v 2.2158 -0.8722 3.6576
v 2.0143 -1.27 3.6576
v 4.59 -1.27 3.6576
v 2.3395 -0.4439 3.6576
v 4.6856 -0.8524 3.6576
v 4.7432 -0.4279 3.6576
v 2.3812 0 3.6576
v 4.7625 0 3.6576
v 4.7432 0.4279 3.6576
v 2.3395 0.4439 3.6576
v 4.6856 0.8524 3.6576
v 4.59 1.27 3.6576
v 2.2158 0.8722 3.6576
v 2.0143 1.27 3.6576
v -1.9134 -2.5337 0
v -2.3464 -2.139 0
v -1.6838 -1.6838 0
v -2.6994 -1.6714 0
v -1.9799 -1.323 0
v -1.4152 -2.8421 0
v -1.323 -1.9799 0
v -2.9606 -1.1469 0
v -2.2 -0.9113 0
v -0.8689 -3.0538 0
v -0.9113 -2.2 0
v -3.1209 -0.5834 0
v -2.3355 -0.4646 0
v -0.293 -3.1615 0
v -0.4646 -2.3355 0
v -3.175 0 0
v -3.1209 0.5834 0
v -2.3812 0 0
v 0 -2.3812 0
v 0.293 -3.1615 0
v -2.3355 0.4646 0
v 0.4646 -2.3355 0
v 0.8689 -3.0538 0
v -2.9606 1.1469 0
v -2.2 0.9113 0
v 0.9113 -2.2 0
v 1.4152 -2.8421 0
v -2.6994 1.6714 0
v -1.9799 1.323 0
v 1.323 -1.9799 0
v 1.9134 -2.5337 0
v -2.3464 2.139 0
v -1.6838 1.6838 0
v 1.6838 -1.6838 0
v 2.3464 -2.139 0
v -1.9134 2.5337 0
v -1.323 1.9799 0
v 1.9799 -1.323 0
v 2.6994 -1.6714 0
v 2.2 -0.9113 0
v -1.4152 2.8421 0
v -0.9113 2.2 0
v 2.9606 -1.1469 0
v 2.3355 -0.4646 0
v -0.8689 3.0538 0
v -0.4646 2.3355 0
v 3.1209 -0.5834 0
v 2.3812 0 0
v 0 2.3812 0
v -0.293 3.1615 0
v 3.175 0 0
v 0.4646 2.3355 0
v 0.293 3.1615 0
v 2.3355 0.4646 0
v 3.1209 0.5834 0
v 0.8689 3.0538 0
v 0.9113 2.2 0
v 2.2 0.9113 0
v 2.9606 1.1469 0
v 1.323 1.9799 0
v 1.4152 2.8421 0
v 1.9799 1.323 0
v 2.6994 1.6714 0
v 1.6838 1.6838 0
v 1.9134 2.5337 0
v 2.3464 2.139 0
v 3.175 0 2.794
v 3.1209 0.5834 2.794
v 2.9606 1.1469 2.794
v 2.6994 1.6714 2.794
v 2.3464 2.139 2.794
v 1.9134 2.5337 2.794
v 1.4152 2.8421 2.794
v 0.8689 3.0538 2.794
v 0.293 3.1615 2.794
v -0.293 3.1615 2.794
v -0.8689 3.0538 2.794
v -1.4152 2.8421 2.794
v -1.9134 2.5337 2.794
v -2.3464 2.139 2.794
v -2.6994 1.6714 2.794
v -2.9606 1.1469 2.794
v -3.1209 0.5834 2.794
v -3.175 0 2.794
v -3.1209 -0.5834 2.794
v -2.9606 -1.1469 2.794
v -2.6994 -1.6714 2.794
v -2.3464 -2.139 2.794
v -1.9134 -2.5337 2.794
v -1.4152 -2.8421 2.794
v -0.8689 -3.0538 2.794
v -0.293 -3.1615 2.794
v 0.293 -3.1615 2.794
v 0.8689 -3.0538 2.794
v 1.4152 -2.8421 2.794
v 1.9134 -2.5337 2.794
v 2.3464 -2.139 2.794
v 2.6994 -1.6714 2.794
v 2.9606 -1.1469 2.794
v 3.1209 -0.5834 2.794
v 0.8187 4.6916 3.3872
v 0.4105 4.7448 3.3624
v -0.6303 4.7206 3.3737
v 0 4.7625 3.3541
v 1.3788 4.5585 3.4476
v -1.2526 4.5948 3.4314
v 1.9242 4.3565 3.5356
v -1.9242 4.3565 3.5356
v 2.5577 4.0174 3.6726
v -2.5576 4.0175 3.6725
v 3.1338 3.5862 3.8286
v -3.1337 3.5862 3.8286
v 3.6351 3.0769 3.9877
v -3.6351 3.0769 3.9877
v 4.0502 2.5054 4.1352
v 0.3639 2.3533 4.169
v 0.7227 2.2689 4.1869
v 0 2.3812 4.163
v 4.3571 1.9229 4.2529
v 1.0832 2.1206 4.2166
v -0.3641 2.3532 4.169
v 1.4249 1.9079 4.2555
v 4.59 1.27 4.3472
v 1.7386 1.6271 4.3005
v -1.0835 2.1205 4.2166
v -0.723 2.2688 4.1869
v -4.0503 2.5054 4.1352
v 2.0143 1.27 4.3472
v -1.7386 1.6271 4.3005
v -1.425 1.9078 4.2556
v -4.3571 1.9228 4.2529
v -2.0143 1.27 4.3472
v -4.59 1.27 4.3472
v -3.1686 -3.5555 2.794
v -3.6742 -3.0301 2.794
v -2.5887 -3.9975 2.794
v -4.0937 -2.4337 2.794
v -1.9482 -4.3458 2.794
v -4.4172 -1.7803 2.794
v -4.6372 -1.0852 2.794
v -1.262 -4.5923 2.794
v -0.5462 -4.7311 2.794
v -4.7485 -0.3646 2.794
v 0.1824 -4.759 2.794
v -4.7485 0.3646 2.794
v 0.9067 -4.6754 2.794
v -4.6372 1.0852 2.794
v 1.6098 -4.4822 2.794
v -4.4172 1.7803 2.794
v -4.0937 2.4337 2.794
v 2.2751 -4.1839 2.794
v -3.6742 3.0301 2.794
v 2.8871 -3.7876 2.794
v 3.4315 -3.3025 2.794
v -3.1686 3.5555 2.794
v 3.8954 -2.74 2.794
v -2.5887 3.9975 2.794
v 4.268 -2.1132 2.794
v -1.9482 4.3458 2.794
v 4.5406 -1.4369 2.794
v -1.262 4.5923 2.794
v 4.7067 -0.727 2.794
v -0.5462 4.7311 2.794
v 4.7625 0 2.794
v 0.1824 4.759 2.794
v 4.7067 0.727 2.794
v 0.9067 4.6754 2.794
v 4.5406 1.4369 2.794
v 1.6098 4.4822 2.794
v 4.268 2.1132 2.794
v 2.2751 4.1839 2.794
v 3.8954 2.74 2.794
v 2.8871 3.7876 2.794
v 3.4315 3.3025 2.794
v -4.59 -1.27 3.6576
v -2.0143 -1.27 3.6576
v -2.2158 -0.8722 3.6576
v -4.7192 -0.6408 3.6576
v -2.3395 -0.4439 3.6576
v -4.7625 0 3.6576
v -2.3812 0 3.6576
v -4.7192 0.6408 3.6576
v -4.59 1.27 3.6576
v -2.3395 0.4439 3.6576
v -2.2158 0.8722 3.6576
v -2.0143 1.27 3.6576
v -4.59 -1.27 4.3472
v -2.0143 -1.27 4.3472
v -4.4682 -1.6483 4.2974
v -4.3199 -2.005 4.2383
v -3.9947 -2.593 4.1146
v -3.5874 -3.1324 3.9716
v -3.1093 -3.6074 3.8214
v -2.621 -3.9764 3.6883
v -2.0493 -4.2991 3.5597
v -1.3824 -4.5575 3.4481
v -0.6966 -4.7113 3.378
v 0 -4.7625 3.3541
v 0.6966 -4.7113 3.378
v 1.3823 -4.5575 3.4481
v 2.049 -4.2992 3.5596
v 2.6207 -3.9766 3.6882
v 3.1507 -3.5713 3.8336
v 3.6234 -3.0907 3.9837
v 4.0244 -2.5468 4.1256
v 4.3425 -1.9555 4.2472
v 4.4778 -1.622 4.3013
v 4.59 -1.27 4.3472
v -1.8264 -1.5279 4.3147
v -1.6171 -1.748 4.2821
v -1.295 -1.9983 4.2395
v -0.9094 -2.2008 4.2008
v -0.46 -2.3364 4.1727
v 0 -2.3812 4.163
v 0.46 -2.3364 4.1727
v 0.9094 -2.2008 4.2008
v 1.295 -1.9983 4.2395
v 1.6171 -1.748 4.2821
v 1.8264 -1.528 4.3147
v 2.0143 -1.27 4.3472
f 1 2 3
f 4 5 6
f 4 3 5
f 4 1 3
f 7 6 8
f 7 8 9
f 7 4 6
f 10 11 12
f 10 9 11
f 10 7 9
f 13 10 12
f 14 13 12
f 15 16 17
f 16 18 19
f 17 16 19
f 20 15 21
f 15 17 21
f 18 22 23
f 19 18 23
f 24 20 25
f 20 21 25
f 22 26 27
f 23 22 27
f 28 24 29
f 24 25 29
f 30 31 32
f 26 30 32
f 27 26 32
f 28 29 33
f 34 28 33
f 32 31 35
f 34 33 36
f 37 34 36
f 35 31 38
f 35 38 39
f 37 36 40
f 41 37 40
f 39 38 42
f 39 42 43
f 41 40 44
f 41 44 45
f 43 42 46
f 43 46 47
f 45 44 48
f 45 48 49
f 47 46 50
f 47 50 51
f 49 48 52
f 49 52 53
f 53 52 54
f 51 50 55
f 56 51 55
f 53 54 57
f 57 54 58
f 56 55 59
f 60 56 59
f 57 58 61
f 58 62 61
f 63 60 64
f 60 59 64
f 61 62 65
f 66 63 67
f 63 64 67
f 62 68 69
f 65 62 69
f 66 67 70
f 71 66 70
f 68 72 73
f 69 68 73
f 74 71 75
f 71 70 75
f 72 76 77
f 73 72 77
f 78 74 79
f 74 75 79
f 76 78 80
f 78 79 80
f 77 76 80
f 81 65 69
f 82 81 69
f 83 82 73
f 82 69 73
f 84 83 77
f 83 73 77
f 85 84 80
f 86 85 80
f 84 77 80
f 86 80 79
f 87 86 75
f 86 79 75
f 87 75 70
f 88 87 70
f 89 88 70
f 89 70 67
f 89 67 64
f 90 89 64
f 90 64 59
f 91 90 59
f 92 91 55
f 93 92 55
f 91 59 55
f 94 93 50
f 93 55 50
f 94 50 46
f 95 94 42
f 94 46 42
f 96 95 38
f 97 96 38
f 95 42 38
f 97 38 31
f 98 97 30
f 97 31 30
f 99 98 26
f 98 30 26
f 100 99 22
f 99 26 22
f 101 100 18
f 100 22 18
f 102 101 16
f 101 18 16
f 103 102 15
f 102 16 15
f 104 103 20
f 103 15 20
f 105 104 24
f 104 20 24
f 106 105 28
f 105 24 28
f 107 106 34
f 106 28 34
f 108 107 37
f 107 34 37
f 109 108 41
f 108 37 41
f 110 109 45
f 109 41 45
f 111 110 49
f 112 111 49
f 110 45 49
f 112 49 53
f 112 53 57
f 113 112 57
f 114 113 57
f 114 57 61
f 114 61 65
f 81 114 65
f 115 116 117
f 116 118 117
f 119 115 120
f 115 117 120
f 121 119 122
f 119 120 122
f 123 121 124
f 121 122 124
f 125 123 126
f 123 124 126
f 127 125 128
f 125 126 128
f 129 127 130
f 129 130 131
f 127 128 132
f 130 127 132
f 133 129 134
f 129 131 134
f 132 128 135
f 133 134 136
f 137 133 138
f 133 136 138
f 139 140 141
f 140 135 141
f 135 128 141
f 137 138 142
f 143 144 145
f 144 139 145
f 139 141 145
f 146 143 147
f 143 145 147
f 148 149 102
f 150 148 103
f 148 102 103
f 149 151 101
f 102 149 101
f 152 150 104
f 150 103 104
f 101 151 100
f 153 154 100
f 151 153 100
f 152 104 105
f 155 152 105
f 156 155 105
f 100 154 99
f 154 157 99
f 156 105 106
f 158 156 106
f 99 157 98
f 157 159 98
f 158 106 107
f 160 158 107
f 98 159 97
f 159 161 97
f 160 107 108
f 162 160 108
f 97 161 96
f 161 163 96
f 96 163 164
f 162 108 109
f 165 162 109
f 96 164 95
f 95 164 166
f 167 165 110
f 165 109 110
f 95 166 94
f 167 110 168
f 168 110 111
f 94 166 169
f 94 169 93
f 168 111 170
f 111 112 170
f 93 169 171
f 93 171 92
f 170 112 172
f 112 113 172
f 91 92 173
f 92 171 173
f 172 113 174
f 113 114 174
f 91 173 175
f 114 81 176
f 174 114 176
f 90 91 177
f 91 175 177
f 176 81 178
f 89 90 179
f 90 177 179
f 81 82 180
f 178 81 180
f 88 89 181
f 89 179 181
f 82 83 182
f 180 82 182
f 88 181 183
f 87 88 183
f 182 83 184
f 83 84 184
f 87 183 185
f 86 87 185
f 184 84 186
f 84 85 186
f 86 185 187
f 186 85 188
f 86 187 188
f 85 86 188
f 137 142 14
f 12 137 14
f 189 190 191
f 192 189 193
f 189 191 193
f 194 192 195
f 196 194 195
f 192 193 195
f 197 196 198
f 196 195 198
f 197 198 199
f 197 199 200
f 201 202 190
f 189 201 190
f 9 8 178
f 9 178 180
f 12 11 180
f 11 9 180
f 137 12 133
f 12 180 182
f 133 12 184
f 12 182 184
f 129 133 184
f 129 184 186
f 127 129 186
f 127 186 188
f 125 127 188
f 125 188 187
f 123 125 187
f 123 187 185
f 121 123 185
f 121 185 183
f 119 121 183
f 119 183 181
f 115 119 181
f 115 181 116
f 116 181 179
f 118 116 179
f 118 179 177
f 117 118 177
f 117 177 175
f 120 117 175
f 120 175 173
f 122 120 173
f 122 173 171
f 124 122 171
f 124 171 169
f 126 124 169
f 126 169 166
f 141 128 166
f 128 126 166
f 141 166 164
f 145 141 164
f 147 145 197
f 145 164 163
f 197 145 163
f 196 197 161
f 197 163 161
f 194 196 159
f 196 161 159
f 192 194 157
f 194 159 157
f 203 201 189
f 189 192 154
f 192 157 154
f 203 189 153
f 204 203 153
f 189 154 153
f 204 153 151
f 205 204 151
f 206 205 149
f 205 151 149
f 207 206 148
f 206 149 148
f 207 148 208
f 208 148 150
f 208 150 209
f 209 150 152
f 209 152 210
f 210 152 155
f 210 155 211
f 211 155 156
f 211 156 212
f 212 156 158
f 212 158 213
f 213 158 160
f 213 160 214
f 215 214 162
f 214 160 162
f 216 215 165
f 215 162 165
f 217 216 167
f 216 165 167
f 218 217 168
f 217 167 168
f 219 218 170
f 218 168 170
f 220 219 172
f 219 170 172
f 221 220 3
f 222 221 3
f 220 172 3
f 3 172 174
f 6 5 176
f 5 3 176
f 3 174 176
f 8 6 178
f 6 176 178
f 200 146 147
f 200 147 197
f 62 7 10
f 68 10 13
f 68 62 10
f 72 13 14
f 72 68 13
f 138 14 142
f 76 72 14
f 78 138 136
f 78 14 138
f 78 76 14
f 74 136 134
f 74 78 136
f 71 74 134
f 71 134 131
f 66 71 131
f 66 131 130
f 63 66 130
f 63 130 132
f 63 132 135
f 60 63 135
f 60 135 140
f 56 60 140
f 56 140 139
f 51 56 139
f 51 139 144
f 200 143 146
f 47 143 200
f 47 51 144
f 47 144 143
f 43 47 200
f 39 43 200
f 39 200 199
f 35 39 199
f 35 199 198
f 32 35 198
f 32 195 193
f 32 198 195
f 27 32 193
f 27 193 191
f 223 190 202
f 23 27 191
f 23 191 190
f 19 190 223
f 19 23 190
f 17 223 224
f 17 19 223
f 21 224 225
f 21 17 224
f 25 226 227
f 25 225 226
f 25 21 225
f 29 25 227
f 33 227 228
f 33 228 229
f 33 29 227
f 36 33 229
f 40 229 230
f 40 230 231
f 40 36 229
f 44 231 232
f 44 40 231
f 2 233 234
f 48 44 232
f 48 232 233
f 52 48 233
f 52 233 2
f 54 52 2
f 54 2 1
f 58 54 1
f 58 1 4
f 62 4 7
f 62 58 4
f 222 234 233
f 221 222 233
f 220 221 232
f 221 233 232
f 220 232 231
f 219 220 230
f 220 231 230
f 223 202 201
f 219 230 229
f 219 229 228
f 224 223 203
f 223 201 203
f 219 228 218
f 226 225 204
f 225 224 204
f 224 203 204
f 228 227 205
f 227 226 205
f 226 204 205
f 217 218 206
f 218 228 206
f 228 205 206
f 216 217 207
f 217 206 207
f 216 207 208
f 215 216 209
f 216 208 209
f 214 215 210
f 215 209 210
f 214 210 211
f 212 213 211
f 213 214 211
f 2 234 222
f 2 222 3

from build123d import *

# Parameters (mm, degrees)
SKETCH1_R               = 3.175
SKETCH1_R_2             = 2.38125
BOSS_EXTRUDE1_DEPTH     = 2.794
SKETCH2_R               = 4.7625
SKETCH2_R_2             = 2.38125
BOSS_EXTRUDE2_DEPTH     = 1.6256
SKETCH3_R               = 22.361166229
SKETCH3_R_2             = 11.176
CUT_EXTRUDE1_DEPTH      = 5.7625
CUT_EXTRUDE1_DEPTH_BACK = 5.7625
SKETCH4_W               = 0.762
SKETCH4_H               = 2.54
CUT_EXTRUDE2_DEPTH      = 5.7625001
CUT_EXTRUDE2_DEPTH_BACK = 5.7625001


with BuildPart() as part:
    # Sketch1 → Boss-Extrude1 (new body)
    with BuildSketch(Plane.XY):
        Circle(SKETCH1_R)
        Circle(SKETCH1_R_2, mode=Mode.SUBTRACT)
    extrude(amount=BOSS_EXTRUDE1_DEPTH)

    # Sketch2 → Boss-Extrude2 (add)
    with BuildSketch(Plane.XY.offset(2.794)):
        Circle(SKETCH2_R)
        Circle(SKETCH2_R_2, mode=Mode.SUBTRACT)
    extrude(amount=BOSS_EXTRUDE2_DEPTH)

    # Sketch3 → Cut-Extrude1 (cut, two sides)
    with BuildSketch(Plane(origin=(0, 0, 0), x_dir=(0, 0, -1), z_dir=(1, 0, 0))) as cut_extrude1_sk:
        with Locations((6.7564, 0)):
            Circle(SKETCH3_R)
        with Locations((6.7564, 0)):
            Circle(SKETCH3_R_2, mode=Mode.SUBTRACT)
    extrude(amount=CUT_EXTRUDE1_DEPTH, mode=Mode.SUBTRACT)
    extrude(cut_extrude1_sk.sketch, amount=-CUT_EXTRUDE1_DEPTH_BACK, mode=Mode.SUBTRACT)

    # Sketch4 → Cut-Extrude2 (cut, two sides)
    with BuildSketch(Plane(origin=(0, 0, 0), x_dir=(0, 0, -1), z_dir=(1, 0, 0))) as cut_extrude2_sk:
        with Locations((-4.0386, 0)):
            Rectangle(SKETCH4_W, SKETCH4_H)
    extrude(amount=CUT_EXTRUDE2_DEPTH, mode=Mode.SUBTRACT)
    extrude(cut_extrude2_sk.sketch, amount=-CUT_EXTRUDE2_DEPTH_BACK, mode=Mode.SUBTRACT)


solid = part.part
